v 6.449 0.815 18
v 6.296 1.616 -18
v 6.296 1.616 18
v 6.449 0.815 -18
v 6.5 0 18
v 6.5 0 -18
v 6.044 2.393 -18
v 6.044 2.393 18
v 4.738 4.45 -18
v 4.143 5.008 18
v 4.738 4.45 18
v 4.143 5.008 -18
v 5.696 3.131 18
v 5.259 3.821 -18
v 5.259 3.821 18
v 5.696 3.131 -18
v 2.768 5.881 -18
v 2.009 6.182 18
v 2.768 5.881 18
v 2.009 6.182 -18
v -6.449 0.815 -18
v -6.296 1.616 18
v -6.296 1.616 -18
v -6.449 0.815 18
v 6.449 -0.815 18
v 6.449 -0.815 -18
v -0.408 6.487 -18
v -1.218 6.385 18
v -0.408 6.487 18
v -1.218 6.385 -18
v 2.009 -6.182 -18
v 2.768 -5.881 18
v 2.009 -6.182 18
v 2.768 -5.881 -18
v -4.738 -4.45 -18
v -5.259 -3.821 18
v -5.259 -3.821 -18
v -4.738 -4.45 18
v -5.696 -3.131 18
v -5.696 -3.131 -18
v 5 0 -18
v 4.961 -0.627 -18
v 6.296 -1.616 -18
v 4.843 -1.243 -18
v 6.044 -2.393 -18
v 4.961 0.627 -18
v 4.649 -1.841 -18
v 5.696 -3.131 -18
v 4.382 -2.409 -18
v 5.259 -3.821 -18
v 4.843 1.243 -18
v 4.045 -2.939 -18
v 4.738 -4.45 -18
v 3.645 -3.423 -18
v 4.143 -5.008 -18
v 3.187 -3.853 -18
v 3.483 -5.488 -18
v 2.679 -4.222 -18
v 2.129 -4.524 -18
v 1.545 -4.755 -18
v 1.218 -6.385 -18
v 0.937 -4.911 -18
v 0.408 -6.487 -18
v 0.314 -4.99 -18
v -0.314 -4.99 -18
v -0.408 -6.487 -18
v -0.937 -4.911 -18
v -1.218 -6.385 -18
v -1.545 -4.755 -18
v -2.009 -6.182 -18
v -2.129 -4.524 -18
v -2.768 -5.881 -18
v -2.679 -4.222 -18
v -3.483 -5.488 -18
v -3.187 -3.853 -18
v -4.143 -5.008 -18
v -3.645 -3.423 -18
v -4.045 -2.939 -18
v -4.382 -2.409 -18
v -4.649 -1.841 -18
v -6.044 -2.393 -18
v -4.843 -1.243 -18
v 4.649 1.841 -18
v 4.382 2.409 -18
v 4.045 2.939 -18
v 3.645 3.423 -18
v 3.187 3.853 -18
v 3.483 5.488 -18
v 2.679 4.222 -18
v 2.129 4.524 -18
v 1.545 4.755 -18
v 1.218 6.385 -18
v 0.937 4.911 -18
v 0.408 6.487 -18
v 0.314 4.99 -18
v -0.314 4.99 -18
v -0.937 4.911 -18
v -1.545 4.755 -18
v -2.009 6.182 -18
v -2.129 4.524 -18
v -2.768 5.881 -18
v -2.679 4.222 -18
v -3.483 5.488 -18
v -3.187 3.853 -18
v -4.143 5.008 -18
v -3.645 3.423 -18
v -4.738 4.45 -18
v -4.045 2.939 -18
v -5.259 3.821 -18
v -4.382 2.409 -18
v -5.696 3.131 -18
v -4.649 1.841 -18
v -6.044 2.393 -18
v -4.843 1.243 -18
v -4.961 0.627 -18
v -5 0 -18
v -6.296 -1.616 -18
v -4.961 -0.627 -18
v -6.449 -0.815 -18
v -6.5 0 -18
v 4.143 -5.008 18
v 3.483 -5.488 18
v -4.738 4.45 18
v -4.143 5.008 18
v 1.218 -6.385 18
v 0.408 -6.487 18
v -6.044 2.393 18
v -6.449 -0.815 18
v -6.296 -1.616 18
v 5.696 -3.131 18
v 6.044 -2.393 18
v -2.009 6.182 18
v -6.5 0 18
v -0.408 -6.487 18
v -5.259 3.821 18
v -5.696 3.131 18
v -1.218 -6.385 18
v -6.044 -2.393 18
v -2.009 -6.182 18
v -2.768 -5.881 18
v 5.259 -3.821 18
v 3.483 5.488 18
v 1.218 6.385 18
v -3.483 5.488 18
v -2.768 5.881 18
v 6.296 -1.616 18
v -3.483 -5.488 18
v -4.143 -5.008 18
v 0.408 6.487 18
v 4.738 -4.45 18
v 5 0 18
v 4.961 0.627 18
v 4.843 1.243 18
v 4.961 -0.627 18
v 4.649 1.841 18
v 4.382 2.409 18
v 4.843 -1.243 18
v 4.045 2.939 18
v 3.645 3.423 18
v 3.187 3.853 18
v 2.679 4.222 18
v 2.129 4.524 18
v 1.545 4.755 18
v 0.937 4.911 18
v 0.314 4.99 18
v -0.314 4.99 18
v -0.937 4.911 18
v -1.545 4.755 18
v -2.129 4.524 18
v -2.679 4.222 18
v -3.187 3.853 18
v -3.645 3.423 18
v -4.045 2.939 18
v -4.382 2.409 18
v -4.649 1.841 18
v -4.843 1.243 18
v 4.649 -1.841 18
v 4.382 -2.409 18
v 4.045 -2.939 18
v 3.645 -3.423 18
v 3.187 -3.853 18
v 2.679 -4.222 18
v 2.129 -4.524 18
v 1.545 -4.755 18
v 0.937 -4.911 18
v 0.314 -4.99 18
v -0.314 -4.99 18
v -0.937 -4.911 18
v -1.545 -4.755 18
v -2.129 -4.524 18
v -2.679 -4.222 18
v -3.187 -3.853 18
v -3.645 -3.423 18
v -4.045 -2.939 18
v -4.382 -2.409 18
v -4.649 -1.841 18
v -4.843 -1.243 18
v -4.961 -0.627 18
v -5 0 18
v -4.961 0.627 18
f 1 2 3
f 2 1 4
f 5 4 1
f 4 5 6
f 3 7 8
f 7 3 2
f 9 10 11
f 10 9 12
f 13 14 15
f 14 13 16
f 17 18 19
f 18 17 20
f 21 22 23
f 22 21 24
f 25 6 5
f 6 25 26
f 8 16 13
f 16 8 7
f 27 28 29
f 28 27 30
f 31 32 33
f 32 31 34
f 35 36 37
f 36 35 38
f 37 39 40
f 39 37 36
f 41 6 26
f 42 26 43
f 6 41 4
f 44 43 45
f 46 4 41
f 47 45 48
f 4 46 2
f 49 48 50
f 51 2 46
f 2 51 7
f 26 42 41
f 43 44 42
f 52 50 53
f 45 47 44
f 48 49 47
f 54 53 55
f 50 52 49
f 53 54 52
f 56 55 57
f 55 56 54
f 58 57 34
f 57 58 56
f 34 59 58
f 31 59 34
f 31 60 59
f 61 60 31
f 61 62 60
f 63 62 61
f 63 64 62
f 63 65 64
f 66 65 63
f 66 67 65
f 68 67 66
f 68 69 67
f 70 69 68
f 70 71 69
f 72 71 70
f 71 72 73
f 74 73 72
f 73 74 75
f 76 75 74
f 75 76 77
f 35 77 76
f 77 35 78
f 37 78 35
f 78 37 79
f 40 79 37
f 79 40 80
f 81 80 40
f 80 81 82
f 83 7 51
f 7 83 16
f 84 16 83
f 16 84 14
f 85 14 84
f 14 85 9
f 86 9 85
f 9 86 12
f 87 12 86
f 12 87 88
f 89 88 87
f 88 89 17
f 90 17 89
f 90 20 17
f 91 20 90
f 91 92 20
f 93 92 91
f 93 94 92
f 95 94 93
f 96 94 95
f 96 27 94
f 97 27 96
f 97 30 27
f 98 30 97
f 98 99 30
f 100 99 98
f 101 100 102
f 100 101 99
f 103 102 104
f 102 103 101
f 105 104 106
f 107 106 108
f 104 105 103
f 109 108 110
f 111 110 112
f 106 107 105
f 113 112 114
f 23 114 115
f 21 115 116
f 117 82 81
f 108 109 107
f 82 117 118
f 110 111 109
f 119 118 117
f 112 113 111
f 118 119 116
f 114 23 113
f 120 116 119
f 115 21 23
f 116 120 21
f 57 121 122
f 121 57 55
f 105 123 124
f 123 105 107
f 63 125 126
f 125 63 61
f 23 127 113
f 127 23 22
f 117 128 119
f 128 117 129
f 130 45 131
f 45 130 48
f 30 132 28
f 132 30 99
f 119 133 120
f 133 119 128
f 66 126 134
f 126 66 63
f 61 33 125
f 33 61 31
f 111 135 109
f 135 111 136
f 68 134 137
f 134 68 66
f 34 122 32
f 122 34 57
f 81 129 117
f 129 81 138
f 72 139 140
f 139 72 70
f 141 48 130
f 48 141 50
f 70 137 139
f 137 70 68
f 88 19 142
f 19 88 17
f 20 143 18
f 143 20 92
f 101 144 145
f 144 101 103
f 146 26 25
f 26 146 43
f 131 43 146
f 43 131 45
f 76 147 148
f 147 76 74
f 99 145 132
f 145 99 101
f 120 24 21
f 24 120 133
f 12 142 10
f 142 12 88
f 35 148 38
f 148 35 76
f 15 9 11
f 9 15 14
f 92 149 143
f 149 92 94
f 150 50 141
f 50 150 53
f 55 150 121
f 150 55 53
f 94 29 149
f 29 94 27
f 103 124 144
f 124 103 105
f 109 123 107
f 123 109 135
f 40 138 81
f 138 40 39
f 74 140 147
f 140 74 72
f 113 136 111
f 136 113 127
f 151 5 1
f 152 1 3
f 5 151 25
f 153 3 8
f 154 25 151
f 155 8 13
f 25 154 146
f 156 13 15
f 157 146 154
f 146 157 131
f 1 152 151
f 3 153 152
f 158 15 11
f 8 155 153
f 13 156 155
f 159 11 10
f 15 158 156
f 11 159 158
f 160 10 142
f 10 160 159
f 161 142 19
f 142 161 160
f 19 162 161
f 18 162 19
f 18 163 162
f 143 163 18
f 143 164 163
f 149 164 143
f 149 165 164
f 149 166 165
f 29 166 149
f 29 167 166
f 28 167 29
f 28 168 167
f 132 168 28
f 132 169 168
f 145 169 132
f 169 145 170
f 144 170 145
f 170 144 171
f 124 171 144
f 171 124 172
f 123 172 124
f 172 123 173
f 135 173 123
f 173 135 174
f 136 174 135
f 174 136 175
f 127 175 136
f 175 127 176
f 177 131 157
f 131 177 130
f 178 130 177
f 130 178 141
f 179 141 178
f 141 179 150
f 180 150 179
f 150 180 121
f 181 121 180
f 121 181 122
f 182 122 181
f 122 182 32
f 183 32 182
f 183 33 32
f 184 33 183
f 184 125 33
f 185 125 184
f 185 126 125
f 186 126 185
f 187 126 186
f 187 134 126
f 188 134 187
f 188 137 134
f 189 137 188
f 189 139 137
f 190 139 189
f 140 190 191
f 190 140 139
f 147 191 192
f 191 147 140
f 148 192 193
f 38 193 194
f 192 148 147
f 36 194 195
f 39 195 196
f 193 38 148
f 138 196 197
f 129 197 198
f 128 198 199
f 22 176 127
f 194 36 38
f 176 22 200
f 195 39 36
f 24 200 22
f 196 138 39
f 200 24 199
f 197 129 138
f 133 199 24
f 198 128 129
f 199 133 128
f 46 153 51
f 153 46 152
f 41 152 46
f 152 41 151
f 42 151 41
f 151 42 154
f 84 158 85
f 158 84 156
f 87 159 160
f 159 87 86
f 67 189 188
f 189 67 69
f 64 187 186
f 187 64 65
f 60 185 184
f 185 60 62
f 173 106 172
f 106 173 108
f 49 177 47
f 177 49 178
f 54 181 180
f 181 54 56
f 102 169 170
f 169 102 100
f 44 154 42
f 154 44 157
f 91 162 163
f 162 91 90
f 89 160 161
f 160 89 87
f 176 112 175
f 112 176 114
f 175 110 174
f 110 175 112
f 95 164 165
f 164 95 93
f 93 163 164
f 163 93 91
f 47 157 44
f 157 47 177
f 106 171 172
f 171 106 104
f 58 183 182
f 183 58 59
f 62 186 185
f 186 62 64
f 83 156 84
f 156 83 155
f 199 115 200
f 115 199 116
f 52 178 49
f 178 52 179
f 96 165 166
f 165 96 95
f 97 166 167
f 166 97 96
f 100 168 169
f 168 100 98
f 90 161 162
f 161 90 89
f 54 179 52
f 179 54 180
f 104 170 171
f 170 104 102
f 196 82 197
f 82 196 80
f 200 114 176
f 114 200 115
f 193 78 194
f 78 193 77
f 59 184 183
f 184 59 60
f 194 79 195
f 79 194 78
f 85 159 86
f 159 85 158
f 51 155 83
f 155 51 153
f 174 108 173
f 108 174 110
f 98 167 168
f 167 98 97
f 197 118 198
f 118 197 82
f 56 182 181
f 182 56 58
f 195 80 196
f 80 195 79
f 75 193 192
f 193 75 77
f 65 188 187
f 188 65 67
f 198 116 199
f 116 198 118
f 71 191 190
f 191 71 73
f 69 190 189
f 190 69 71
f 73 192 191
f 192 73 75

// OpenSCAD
$fn = 50;


difference() {
	union() {
		translate(v = [0, 0, -18.0000000000]) {
			cylinder(h = 36, r = 6.5000000000);
		}
	}
	union() {
		translate(v = [0, 0, -100.0000000000]) {
			cylinder(h = 200, r = 5.0000000000);
		}
	}
}
